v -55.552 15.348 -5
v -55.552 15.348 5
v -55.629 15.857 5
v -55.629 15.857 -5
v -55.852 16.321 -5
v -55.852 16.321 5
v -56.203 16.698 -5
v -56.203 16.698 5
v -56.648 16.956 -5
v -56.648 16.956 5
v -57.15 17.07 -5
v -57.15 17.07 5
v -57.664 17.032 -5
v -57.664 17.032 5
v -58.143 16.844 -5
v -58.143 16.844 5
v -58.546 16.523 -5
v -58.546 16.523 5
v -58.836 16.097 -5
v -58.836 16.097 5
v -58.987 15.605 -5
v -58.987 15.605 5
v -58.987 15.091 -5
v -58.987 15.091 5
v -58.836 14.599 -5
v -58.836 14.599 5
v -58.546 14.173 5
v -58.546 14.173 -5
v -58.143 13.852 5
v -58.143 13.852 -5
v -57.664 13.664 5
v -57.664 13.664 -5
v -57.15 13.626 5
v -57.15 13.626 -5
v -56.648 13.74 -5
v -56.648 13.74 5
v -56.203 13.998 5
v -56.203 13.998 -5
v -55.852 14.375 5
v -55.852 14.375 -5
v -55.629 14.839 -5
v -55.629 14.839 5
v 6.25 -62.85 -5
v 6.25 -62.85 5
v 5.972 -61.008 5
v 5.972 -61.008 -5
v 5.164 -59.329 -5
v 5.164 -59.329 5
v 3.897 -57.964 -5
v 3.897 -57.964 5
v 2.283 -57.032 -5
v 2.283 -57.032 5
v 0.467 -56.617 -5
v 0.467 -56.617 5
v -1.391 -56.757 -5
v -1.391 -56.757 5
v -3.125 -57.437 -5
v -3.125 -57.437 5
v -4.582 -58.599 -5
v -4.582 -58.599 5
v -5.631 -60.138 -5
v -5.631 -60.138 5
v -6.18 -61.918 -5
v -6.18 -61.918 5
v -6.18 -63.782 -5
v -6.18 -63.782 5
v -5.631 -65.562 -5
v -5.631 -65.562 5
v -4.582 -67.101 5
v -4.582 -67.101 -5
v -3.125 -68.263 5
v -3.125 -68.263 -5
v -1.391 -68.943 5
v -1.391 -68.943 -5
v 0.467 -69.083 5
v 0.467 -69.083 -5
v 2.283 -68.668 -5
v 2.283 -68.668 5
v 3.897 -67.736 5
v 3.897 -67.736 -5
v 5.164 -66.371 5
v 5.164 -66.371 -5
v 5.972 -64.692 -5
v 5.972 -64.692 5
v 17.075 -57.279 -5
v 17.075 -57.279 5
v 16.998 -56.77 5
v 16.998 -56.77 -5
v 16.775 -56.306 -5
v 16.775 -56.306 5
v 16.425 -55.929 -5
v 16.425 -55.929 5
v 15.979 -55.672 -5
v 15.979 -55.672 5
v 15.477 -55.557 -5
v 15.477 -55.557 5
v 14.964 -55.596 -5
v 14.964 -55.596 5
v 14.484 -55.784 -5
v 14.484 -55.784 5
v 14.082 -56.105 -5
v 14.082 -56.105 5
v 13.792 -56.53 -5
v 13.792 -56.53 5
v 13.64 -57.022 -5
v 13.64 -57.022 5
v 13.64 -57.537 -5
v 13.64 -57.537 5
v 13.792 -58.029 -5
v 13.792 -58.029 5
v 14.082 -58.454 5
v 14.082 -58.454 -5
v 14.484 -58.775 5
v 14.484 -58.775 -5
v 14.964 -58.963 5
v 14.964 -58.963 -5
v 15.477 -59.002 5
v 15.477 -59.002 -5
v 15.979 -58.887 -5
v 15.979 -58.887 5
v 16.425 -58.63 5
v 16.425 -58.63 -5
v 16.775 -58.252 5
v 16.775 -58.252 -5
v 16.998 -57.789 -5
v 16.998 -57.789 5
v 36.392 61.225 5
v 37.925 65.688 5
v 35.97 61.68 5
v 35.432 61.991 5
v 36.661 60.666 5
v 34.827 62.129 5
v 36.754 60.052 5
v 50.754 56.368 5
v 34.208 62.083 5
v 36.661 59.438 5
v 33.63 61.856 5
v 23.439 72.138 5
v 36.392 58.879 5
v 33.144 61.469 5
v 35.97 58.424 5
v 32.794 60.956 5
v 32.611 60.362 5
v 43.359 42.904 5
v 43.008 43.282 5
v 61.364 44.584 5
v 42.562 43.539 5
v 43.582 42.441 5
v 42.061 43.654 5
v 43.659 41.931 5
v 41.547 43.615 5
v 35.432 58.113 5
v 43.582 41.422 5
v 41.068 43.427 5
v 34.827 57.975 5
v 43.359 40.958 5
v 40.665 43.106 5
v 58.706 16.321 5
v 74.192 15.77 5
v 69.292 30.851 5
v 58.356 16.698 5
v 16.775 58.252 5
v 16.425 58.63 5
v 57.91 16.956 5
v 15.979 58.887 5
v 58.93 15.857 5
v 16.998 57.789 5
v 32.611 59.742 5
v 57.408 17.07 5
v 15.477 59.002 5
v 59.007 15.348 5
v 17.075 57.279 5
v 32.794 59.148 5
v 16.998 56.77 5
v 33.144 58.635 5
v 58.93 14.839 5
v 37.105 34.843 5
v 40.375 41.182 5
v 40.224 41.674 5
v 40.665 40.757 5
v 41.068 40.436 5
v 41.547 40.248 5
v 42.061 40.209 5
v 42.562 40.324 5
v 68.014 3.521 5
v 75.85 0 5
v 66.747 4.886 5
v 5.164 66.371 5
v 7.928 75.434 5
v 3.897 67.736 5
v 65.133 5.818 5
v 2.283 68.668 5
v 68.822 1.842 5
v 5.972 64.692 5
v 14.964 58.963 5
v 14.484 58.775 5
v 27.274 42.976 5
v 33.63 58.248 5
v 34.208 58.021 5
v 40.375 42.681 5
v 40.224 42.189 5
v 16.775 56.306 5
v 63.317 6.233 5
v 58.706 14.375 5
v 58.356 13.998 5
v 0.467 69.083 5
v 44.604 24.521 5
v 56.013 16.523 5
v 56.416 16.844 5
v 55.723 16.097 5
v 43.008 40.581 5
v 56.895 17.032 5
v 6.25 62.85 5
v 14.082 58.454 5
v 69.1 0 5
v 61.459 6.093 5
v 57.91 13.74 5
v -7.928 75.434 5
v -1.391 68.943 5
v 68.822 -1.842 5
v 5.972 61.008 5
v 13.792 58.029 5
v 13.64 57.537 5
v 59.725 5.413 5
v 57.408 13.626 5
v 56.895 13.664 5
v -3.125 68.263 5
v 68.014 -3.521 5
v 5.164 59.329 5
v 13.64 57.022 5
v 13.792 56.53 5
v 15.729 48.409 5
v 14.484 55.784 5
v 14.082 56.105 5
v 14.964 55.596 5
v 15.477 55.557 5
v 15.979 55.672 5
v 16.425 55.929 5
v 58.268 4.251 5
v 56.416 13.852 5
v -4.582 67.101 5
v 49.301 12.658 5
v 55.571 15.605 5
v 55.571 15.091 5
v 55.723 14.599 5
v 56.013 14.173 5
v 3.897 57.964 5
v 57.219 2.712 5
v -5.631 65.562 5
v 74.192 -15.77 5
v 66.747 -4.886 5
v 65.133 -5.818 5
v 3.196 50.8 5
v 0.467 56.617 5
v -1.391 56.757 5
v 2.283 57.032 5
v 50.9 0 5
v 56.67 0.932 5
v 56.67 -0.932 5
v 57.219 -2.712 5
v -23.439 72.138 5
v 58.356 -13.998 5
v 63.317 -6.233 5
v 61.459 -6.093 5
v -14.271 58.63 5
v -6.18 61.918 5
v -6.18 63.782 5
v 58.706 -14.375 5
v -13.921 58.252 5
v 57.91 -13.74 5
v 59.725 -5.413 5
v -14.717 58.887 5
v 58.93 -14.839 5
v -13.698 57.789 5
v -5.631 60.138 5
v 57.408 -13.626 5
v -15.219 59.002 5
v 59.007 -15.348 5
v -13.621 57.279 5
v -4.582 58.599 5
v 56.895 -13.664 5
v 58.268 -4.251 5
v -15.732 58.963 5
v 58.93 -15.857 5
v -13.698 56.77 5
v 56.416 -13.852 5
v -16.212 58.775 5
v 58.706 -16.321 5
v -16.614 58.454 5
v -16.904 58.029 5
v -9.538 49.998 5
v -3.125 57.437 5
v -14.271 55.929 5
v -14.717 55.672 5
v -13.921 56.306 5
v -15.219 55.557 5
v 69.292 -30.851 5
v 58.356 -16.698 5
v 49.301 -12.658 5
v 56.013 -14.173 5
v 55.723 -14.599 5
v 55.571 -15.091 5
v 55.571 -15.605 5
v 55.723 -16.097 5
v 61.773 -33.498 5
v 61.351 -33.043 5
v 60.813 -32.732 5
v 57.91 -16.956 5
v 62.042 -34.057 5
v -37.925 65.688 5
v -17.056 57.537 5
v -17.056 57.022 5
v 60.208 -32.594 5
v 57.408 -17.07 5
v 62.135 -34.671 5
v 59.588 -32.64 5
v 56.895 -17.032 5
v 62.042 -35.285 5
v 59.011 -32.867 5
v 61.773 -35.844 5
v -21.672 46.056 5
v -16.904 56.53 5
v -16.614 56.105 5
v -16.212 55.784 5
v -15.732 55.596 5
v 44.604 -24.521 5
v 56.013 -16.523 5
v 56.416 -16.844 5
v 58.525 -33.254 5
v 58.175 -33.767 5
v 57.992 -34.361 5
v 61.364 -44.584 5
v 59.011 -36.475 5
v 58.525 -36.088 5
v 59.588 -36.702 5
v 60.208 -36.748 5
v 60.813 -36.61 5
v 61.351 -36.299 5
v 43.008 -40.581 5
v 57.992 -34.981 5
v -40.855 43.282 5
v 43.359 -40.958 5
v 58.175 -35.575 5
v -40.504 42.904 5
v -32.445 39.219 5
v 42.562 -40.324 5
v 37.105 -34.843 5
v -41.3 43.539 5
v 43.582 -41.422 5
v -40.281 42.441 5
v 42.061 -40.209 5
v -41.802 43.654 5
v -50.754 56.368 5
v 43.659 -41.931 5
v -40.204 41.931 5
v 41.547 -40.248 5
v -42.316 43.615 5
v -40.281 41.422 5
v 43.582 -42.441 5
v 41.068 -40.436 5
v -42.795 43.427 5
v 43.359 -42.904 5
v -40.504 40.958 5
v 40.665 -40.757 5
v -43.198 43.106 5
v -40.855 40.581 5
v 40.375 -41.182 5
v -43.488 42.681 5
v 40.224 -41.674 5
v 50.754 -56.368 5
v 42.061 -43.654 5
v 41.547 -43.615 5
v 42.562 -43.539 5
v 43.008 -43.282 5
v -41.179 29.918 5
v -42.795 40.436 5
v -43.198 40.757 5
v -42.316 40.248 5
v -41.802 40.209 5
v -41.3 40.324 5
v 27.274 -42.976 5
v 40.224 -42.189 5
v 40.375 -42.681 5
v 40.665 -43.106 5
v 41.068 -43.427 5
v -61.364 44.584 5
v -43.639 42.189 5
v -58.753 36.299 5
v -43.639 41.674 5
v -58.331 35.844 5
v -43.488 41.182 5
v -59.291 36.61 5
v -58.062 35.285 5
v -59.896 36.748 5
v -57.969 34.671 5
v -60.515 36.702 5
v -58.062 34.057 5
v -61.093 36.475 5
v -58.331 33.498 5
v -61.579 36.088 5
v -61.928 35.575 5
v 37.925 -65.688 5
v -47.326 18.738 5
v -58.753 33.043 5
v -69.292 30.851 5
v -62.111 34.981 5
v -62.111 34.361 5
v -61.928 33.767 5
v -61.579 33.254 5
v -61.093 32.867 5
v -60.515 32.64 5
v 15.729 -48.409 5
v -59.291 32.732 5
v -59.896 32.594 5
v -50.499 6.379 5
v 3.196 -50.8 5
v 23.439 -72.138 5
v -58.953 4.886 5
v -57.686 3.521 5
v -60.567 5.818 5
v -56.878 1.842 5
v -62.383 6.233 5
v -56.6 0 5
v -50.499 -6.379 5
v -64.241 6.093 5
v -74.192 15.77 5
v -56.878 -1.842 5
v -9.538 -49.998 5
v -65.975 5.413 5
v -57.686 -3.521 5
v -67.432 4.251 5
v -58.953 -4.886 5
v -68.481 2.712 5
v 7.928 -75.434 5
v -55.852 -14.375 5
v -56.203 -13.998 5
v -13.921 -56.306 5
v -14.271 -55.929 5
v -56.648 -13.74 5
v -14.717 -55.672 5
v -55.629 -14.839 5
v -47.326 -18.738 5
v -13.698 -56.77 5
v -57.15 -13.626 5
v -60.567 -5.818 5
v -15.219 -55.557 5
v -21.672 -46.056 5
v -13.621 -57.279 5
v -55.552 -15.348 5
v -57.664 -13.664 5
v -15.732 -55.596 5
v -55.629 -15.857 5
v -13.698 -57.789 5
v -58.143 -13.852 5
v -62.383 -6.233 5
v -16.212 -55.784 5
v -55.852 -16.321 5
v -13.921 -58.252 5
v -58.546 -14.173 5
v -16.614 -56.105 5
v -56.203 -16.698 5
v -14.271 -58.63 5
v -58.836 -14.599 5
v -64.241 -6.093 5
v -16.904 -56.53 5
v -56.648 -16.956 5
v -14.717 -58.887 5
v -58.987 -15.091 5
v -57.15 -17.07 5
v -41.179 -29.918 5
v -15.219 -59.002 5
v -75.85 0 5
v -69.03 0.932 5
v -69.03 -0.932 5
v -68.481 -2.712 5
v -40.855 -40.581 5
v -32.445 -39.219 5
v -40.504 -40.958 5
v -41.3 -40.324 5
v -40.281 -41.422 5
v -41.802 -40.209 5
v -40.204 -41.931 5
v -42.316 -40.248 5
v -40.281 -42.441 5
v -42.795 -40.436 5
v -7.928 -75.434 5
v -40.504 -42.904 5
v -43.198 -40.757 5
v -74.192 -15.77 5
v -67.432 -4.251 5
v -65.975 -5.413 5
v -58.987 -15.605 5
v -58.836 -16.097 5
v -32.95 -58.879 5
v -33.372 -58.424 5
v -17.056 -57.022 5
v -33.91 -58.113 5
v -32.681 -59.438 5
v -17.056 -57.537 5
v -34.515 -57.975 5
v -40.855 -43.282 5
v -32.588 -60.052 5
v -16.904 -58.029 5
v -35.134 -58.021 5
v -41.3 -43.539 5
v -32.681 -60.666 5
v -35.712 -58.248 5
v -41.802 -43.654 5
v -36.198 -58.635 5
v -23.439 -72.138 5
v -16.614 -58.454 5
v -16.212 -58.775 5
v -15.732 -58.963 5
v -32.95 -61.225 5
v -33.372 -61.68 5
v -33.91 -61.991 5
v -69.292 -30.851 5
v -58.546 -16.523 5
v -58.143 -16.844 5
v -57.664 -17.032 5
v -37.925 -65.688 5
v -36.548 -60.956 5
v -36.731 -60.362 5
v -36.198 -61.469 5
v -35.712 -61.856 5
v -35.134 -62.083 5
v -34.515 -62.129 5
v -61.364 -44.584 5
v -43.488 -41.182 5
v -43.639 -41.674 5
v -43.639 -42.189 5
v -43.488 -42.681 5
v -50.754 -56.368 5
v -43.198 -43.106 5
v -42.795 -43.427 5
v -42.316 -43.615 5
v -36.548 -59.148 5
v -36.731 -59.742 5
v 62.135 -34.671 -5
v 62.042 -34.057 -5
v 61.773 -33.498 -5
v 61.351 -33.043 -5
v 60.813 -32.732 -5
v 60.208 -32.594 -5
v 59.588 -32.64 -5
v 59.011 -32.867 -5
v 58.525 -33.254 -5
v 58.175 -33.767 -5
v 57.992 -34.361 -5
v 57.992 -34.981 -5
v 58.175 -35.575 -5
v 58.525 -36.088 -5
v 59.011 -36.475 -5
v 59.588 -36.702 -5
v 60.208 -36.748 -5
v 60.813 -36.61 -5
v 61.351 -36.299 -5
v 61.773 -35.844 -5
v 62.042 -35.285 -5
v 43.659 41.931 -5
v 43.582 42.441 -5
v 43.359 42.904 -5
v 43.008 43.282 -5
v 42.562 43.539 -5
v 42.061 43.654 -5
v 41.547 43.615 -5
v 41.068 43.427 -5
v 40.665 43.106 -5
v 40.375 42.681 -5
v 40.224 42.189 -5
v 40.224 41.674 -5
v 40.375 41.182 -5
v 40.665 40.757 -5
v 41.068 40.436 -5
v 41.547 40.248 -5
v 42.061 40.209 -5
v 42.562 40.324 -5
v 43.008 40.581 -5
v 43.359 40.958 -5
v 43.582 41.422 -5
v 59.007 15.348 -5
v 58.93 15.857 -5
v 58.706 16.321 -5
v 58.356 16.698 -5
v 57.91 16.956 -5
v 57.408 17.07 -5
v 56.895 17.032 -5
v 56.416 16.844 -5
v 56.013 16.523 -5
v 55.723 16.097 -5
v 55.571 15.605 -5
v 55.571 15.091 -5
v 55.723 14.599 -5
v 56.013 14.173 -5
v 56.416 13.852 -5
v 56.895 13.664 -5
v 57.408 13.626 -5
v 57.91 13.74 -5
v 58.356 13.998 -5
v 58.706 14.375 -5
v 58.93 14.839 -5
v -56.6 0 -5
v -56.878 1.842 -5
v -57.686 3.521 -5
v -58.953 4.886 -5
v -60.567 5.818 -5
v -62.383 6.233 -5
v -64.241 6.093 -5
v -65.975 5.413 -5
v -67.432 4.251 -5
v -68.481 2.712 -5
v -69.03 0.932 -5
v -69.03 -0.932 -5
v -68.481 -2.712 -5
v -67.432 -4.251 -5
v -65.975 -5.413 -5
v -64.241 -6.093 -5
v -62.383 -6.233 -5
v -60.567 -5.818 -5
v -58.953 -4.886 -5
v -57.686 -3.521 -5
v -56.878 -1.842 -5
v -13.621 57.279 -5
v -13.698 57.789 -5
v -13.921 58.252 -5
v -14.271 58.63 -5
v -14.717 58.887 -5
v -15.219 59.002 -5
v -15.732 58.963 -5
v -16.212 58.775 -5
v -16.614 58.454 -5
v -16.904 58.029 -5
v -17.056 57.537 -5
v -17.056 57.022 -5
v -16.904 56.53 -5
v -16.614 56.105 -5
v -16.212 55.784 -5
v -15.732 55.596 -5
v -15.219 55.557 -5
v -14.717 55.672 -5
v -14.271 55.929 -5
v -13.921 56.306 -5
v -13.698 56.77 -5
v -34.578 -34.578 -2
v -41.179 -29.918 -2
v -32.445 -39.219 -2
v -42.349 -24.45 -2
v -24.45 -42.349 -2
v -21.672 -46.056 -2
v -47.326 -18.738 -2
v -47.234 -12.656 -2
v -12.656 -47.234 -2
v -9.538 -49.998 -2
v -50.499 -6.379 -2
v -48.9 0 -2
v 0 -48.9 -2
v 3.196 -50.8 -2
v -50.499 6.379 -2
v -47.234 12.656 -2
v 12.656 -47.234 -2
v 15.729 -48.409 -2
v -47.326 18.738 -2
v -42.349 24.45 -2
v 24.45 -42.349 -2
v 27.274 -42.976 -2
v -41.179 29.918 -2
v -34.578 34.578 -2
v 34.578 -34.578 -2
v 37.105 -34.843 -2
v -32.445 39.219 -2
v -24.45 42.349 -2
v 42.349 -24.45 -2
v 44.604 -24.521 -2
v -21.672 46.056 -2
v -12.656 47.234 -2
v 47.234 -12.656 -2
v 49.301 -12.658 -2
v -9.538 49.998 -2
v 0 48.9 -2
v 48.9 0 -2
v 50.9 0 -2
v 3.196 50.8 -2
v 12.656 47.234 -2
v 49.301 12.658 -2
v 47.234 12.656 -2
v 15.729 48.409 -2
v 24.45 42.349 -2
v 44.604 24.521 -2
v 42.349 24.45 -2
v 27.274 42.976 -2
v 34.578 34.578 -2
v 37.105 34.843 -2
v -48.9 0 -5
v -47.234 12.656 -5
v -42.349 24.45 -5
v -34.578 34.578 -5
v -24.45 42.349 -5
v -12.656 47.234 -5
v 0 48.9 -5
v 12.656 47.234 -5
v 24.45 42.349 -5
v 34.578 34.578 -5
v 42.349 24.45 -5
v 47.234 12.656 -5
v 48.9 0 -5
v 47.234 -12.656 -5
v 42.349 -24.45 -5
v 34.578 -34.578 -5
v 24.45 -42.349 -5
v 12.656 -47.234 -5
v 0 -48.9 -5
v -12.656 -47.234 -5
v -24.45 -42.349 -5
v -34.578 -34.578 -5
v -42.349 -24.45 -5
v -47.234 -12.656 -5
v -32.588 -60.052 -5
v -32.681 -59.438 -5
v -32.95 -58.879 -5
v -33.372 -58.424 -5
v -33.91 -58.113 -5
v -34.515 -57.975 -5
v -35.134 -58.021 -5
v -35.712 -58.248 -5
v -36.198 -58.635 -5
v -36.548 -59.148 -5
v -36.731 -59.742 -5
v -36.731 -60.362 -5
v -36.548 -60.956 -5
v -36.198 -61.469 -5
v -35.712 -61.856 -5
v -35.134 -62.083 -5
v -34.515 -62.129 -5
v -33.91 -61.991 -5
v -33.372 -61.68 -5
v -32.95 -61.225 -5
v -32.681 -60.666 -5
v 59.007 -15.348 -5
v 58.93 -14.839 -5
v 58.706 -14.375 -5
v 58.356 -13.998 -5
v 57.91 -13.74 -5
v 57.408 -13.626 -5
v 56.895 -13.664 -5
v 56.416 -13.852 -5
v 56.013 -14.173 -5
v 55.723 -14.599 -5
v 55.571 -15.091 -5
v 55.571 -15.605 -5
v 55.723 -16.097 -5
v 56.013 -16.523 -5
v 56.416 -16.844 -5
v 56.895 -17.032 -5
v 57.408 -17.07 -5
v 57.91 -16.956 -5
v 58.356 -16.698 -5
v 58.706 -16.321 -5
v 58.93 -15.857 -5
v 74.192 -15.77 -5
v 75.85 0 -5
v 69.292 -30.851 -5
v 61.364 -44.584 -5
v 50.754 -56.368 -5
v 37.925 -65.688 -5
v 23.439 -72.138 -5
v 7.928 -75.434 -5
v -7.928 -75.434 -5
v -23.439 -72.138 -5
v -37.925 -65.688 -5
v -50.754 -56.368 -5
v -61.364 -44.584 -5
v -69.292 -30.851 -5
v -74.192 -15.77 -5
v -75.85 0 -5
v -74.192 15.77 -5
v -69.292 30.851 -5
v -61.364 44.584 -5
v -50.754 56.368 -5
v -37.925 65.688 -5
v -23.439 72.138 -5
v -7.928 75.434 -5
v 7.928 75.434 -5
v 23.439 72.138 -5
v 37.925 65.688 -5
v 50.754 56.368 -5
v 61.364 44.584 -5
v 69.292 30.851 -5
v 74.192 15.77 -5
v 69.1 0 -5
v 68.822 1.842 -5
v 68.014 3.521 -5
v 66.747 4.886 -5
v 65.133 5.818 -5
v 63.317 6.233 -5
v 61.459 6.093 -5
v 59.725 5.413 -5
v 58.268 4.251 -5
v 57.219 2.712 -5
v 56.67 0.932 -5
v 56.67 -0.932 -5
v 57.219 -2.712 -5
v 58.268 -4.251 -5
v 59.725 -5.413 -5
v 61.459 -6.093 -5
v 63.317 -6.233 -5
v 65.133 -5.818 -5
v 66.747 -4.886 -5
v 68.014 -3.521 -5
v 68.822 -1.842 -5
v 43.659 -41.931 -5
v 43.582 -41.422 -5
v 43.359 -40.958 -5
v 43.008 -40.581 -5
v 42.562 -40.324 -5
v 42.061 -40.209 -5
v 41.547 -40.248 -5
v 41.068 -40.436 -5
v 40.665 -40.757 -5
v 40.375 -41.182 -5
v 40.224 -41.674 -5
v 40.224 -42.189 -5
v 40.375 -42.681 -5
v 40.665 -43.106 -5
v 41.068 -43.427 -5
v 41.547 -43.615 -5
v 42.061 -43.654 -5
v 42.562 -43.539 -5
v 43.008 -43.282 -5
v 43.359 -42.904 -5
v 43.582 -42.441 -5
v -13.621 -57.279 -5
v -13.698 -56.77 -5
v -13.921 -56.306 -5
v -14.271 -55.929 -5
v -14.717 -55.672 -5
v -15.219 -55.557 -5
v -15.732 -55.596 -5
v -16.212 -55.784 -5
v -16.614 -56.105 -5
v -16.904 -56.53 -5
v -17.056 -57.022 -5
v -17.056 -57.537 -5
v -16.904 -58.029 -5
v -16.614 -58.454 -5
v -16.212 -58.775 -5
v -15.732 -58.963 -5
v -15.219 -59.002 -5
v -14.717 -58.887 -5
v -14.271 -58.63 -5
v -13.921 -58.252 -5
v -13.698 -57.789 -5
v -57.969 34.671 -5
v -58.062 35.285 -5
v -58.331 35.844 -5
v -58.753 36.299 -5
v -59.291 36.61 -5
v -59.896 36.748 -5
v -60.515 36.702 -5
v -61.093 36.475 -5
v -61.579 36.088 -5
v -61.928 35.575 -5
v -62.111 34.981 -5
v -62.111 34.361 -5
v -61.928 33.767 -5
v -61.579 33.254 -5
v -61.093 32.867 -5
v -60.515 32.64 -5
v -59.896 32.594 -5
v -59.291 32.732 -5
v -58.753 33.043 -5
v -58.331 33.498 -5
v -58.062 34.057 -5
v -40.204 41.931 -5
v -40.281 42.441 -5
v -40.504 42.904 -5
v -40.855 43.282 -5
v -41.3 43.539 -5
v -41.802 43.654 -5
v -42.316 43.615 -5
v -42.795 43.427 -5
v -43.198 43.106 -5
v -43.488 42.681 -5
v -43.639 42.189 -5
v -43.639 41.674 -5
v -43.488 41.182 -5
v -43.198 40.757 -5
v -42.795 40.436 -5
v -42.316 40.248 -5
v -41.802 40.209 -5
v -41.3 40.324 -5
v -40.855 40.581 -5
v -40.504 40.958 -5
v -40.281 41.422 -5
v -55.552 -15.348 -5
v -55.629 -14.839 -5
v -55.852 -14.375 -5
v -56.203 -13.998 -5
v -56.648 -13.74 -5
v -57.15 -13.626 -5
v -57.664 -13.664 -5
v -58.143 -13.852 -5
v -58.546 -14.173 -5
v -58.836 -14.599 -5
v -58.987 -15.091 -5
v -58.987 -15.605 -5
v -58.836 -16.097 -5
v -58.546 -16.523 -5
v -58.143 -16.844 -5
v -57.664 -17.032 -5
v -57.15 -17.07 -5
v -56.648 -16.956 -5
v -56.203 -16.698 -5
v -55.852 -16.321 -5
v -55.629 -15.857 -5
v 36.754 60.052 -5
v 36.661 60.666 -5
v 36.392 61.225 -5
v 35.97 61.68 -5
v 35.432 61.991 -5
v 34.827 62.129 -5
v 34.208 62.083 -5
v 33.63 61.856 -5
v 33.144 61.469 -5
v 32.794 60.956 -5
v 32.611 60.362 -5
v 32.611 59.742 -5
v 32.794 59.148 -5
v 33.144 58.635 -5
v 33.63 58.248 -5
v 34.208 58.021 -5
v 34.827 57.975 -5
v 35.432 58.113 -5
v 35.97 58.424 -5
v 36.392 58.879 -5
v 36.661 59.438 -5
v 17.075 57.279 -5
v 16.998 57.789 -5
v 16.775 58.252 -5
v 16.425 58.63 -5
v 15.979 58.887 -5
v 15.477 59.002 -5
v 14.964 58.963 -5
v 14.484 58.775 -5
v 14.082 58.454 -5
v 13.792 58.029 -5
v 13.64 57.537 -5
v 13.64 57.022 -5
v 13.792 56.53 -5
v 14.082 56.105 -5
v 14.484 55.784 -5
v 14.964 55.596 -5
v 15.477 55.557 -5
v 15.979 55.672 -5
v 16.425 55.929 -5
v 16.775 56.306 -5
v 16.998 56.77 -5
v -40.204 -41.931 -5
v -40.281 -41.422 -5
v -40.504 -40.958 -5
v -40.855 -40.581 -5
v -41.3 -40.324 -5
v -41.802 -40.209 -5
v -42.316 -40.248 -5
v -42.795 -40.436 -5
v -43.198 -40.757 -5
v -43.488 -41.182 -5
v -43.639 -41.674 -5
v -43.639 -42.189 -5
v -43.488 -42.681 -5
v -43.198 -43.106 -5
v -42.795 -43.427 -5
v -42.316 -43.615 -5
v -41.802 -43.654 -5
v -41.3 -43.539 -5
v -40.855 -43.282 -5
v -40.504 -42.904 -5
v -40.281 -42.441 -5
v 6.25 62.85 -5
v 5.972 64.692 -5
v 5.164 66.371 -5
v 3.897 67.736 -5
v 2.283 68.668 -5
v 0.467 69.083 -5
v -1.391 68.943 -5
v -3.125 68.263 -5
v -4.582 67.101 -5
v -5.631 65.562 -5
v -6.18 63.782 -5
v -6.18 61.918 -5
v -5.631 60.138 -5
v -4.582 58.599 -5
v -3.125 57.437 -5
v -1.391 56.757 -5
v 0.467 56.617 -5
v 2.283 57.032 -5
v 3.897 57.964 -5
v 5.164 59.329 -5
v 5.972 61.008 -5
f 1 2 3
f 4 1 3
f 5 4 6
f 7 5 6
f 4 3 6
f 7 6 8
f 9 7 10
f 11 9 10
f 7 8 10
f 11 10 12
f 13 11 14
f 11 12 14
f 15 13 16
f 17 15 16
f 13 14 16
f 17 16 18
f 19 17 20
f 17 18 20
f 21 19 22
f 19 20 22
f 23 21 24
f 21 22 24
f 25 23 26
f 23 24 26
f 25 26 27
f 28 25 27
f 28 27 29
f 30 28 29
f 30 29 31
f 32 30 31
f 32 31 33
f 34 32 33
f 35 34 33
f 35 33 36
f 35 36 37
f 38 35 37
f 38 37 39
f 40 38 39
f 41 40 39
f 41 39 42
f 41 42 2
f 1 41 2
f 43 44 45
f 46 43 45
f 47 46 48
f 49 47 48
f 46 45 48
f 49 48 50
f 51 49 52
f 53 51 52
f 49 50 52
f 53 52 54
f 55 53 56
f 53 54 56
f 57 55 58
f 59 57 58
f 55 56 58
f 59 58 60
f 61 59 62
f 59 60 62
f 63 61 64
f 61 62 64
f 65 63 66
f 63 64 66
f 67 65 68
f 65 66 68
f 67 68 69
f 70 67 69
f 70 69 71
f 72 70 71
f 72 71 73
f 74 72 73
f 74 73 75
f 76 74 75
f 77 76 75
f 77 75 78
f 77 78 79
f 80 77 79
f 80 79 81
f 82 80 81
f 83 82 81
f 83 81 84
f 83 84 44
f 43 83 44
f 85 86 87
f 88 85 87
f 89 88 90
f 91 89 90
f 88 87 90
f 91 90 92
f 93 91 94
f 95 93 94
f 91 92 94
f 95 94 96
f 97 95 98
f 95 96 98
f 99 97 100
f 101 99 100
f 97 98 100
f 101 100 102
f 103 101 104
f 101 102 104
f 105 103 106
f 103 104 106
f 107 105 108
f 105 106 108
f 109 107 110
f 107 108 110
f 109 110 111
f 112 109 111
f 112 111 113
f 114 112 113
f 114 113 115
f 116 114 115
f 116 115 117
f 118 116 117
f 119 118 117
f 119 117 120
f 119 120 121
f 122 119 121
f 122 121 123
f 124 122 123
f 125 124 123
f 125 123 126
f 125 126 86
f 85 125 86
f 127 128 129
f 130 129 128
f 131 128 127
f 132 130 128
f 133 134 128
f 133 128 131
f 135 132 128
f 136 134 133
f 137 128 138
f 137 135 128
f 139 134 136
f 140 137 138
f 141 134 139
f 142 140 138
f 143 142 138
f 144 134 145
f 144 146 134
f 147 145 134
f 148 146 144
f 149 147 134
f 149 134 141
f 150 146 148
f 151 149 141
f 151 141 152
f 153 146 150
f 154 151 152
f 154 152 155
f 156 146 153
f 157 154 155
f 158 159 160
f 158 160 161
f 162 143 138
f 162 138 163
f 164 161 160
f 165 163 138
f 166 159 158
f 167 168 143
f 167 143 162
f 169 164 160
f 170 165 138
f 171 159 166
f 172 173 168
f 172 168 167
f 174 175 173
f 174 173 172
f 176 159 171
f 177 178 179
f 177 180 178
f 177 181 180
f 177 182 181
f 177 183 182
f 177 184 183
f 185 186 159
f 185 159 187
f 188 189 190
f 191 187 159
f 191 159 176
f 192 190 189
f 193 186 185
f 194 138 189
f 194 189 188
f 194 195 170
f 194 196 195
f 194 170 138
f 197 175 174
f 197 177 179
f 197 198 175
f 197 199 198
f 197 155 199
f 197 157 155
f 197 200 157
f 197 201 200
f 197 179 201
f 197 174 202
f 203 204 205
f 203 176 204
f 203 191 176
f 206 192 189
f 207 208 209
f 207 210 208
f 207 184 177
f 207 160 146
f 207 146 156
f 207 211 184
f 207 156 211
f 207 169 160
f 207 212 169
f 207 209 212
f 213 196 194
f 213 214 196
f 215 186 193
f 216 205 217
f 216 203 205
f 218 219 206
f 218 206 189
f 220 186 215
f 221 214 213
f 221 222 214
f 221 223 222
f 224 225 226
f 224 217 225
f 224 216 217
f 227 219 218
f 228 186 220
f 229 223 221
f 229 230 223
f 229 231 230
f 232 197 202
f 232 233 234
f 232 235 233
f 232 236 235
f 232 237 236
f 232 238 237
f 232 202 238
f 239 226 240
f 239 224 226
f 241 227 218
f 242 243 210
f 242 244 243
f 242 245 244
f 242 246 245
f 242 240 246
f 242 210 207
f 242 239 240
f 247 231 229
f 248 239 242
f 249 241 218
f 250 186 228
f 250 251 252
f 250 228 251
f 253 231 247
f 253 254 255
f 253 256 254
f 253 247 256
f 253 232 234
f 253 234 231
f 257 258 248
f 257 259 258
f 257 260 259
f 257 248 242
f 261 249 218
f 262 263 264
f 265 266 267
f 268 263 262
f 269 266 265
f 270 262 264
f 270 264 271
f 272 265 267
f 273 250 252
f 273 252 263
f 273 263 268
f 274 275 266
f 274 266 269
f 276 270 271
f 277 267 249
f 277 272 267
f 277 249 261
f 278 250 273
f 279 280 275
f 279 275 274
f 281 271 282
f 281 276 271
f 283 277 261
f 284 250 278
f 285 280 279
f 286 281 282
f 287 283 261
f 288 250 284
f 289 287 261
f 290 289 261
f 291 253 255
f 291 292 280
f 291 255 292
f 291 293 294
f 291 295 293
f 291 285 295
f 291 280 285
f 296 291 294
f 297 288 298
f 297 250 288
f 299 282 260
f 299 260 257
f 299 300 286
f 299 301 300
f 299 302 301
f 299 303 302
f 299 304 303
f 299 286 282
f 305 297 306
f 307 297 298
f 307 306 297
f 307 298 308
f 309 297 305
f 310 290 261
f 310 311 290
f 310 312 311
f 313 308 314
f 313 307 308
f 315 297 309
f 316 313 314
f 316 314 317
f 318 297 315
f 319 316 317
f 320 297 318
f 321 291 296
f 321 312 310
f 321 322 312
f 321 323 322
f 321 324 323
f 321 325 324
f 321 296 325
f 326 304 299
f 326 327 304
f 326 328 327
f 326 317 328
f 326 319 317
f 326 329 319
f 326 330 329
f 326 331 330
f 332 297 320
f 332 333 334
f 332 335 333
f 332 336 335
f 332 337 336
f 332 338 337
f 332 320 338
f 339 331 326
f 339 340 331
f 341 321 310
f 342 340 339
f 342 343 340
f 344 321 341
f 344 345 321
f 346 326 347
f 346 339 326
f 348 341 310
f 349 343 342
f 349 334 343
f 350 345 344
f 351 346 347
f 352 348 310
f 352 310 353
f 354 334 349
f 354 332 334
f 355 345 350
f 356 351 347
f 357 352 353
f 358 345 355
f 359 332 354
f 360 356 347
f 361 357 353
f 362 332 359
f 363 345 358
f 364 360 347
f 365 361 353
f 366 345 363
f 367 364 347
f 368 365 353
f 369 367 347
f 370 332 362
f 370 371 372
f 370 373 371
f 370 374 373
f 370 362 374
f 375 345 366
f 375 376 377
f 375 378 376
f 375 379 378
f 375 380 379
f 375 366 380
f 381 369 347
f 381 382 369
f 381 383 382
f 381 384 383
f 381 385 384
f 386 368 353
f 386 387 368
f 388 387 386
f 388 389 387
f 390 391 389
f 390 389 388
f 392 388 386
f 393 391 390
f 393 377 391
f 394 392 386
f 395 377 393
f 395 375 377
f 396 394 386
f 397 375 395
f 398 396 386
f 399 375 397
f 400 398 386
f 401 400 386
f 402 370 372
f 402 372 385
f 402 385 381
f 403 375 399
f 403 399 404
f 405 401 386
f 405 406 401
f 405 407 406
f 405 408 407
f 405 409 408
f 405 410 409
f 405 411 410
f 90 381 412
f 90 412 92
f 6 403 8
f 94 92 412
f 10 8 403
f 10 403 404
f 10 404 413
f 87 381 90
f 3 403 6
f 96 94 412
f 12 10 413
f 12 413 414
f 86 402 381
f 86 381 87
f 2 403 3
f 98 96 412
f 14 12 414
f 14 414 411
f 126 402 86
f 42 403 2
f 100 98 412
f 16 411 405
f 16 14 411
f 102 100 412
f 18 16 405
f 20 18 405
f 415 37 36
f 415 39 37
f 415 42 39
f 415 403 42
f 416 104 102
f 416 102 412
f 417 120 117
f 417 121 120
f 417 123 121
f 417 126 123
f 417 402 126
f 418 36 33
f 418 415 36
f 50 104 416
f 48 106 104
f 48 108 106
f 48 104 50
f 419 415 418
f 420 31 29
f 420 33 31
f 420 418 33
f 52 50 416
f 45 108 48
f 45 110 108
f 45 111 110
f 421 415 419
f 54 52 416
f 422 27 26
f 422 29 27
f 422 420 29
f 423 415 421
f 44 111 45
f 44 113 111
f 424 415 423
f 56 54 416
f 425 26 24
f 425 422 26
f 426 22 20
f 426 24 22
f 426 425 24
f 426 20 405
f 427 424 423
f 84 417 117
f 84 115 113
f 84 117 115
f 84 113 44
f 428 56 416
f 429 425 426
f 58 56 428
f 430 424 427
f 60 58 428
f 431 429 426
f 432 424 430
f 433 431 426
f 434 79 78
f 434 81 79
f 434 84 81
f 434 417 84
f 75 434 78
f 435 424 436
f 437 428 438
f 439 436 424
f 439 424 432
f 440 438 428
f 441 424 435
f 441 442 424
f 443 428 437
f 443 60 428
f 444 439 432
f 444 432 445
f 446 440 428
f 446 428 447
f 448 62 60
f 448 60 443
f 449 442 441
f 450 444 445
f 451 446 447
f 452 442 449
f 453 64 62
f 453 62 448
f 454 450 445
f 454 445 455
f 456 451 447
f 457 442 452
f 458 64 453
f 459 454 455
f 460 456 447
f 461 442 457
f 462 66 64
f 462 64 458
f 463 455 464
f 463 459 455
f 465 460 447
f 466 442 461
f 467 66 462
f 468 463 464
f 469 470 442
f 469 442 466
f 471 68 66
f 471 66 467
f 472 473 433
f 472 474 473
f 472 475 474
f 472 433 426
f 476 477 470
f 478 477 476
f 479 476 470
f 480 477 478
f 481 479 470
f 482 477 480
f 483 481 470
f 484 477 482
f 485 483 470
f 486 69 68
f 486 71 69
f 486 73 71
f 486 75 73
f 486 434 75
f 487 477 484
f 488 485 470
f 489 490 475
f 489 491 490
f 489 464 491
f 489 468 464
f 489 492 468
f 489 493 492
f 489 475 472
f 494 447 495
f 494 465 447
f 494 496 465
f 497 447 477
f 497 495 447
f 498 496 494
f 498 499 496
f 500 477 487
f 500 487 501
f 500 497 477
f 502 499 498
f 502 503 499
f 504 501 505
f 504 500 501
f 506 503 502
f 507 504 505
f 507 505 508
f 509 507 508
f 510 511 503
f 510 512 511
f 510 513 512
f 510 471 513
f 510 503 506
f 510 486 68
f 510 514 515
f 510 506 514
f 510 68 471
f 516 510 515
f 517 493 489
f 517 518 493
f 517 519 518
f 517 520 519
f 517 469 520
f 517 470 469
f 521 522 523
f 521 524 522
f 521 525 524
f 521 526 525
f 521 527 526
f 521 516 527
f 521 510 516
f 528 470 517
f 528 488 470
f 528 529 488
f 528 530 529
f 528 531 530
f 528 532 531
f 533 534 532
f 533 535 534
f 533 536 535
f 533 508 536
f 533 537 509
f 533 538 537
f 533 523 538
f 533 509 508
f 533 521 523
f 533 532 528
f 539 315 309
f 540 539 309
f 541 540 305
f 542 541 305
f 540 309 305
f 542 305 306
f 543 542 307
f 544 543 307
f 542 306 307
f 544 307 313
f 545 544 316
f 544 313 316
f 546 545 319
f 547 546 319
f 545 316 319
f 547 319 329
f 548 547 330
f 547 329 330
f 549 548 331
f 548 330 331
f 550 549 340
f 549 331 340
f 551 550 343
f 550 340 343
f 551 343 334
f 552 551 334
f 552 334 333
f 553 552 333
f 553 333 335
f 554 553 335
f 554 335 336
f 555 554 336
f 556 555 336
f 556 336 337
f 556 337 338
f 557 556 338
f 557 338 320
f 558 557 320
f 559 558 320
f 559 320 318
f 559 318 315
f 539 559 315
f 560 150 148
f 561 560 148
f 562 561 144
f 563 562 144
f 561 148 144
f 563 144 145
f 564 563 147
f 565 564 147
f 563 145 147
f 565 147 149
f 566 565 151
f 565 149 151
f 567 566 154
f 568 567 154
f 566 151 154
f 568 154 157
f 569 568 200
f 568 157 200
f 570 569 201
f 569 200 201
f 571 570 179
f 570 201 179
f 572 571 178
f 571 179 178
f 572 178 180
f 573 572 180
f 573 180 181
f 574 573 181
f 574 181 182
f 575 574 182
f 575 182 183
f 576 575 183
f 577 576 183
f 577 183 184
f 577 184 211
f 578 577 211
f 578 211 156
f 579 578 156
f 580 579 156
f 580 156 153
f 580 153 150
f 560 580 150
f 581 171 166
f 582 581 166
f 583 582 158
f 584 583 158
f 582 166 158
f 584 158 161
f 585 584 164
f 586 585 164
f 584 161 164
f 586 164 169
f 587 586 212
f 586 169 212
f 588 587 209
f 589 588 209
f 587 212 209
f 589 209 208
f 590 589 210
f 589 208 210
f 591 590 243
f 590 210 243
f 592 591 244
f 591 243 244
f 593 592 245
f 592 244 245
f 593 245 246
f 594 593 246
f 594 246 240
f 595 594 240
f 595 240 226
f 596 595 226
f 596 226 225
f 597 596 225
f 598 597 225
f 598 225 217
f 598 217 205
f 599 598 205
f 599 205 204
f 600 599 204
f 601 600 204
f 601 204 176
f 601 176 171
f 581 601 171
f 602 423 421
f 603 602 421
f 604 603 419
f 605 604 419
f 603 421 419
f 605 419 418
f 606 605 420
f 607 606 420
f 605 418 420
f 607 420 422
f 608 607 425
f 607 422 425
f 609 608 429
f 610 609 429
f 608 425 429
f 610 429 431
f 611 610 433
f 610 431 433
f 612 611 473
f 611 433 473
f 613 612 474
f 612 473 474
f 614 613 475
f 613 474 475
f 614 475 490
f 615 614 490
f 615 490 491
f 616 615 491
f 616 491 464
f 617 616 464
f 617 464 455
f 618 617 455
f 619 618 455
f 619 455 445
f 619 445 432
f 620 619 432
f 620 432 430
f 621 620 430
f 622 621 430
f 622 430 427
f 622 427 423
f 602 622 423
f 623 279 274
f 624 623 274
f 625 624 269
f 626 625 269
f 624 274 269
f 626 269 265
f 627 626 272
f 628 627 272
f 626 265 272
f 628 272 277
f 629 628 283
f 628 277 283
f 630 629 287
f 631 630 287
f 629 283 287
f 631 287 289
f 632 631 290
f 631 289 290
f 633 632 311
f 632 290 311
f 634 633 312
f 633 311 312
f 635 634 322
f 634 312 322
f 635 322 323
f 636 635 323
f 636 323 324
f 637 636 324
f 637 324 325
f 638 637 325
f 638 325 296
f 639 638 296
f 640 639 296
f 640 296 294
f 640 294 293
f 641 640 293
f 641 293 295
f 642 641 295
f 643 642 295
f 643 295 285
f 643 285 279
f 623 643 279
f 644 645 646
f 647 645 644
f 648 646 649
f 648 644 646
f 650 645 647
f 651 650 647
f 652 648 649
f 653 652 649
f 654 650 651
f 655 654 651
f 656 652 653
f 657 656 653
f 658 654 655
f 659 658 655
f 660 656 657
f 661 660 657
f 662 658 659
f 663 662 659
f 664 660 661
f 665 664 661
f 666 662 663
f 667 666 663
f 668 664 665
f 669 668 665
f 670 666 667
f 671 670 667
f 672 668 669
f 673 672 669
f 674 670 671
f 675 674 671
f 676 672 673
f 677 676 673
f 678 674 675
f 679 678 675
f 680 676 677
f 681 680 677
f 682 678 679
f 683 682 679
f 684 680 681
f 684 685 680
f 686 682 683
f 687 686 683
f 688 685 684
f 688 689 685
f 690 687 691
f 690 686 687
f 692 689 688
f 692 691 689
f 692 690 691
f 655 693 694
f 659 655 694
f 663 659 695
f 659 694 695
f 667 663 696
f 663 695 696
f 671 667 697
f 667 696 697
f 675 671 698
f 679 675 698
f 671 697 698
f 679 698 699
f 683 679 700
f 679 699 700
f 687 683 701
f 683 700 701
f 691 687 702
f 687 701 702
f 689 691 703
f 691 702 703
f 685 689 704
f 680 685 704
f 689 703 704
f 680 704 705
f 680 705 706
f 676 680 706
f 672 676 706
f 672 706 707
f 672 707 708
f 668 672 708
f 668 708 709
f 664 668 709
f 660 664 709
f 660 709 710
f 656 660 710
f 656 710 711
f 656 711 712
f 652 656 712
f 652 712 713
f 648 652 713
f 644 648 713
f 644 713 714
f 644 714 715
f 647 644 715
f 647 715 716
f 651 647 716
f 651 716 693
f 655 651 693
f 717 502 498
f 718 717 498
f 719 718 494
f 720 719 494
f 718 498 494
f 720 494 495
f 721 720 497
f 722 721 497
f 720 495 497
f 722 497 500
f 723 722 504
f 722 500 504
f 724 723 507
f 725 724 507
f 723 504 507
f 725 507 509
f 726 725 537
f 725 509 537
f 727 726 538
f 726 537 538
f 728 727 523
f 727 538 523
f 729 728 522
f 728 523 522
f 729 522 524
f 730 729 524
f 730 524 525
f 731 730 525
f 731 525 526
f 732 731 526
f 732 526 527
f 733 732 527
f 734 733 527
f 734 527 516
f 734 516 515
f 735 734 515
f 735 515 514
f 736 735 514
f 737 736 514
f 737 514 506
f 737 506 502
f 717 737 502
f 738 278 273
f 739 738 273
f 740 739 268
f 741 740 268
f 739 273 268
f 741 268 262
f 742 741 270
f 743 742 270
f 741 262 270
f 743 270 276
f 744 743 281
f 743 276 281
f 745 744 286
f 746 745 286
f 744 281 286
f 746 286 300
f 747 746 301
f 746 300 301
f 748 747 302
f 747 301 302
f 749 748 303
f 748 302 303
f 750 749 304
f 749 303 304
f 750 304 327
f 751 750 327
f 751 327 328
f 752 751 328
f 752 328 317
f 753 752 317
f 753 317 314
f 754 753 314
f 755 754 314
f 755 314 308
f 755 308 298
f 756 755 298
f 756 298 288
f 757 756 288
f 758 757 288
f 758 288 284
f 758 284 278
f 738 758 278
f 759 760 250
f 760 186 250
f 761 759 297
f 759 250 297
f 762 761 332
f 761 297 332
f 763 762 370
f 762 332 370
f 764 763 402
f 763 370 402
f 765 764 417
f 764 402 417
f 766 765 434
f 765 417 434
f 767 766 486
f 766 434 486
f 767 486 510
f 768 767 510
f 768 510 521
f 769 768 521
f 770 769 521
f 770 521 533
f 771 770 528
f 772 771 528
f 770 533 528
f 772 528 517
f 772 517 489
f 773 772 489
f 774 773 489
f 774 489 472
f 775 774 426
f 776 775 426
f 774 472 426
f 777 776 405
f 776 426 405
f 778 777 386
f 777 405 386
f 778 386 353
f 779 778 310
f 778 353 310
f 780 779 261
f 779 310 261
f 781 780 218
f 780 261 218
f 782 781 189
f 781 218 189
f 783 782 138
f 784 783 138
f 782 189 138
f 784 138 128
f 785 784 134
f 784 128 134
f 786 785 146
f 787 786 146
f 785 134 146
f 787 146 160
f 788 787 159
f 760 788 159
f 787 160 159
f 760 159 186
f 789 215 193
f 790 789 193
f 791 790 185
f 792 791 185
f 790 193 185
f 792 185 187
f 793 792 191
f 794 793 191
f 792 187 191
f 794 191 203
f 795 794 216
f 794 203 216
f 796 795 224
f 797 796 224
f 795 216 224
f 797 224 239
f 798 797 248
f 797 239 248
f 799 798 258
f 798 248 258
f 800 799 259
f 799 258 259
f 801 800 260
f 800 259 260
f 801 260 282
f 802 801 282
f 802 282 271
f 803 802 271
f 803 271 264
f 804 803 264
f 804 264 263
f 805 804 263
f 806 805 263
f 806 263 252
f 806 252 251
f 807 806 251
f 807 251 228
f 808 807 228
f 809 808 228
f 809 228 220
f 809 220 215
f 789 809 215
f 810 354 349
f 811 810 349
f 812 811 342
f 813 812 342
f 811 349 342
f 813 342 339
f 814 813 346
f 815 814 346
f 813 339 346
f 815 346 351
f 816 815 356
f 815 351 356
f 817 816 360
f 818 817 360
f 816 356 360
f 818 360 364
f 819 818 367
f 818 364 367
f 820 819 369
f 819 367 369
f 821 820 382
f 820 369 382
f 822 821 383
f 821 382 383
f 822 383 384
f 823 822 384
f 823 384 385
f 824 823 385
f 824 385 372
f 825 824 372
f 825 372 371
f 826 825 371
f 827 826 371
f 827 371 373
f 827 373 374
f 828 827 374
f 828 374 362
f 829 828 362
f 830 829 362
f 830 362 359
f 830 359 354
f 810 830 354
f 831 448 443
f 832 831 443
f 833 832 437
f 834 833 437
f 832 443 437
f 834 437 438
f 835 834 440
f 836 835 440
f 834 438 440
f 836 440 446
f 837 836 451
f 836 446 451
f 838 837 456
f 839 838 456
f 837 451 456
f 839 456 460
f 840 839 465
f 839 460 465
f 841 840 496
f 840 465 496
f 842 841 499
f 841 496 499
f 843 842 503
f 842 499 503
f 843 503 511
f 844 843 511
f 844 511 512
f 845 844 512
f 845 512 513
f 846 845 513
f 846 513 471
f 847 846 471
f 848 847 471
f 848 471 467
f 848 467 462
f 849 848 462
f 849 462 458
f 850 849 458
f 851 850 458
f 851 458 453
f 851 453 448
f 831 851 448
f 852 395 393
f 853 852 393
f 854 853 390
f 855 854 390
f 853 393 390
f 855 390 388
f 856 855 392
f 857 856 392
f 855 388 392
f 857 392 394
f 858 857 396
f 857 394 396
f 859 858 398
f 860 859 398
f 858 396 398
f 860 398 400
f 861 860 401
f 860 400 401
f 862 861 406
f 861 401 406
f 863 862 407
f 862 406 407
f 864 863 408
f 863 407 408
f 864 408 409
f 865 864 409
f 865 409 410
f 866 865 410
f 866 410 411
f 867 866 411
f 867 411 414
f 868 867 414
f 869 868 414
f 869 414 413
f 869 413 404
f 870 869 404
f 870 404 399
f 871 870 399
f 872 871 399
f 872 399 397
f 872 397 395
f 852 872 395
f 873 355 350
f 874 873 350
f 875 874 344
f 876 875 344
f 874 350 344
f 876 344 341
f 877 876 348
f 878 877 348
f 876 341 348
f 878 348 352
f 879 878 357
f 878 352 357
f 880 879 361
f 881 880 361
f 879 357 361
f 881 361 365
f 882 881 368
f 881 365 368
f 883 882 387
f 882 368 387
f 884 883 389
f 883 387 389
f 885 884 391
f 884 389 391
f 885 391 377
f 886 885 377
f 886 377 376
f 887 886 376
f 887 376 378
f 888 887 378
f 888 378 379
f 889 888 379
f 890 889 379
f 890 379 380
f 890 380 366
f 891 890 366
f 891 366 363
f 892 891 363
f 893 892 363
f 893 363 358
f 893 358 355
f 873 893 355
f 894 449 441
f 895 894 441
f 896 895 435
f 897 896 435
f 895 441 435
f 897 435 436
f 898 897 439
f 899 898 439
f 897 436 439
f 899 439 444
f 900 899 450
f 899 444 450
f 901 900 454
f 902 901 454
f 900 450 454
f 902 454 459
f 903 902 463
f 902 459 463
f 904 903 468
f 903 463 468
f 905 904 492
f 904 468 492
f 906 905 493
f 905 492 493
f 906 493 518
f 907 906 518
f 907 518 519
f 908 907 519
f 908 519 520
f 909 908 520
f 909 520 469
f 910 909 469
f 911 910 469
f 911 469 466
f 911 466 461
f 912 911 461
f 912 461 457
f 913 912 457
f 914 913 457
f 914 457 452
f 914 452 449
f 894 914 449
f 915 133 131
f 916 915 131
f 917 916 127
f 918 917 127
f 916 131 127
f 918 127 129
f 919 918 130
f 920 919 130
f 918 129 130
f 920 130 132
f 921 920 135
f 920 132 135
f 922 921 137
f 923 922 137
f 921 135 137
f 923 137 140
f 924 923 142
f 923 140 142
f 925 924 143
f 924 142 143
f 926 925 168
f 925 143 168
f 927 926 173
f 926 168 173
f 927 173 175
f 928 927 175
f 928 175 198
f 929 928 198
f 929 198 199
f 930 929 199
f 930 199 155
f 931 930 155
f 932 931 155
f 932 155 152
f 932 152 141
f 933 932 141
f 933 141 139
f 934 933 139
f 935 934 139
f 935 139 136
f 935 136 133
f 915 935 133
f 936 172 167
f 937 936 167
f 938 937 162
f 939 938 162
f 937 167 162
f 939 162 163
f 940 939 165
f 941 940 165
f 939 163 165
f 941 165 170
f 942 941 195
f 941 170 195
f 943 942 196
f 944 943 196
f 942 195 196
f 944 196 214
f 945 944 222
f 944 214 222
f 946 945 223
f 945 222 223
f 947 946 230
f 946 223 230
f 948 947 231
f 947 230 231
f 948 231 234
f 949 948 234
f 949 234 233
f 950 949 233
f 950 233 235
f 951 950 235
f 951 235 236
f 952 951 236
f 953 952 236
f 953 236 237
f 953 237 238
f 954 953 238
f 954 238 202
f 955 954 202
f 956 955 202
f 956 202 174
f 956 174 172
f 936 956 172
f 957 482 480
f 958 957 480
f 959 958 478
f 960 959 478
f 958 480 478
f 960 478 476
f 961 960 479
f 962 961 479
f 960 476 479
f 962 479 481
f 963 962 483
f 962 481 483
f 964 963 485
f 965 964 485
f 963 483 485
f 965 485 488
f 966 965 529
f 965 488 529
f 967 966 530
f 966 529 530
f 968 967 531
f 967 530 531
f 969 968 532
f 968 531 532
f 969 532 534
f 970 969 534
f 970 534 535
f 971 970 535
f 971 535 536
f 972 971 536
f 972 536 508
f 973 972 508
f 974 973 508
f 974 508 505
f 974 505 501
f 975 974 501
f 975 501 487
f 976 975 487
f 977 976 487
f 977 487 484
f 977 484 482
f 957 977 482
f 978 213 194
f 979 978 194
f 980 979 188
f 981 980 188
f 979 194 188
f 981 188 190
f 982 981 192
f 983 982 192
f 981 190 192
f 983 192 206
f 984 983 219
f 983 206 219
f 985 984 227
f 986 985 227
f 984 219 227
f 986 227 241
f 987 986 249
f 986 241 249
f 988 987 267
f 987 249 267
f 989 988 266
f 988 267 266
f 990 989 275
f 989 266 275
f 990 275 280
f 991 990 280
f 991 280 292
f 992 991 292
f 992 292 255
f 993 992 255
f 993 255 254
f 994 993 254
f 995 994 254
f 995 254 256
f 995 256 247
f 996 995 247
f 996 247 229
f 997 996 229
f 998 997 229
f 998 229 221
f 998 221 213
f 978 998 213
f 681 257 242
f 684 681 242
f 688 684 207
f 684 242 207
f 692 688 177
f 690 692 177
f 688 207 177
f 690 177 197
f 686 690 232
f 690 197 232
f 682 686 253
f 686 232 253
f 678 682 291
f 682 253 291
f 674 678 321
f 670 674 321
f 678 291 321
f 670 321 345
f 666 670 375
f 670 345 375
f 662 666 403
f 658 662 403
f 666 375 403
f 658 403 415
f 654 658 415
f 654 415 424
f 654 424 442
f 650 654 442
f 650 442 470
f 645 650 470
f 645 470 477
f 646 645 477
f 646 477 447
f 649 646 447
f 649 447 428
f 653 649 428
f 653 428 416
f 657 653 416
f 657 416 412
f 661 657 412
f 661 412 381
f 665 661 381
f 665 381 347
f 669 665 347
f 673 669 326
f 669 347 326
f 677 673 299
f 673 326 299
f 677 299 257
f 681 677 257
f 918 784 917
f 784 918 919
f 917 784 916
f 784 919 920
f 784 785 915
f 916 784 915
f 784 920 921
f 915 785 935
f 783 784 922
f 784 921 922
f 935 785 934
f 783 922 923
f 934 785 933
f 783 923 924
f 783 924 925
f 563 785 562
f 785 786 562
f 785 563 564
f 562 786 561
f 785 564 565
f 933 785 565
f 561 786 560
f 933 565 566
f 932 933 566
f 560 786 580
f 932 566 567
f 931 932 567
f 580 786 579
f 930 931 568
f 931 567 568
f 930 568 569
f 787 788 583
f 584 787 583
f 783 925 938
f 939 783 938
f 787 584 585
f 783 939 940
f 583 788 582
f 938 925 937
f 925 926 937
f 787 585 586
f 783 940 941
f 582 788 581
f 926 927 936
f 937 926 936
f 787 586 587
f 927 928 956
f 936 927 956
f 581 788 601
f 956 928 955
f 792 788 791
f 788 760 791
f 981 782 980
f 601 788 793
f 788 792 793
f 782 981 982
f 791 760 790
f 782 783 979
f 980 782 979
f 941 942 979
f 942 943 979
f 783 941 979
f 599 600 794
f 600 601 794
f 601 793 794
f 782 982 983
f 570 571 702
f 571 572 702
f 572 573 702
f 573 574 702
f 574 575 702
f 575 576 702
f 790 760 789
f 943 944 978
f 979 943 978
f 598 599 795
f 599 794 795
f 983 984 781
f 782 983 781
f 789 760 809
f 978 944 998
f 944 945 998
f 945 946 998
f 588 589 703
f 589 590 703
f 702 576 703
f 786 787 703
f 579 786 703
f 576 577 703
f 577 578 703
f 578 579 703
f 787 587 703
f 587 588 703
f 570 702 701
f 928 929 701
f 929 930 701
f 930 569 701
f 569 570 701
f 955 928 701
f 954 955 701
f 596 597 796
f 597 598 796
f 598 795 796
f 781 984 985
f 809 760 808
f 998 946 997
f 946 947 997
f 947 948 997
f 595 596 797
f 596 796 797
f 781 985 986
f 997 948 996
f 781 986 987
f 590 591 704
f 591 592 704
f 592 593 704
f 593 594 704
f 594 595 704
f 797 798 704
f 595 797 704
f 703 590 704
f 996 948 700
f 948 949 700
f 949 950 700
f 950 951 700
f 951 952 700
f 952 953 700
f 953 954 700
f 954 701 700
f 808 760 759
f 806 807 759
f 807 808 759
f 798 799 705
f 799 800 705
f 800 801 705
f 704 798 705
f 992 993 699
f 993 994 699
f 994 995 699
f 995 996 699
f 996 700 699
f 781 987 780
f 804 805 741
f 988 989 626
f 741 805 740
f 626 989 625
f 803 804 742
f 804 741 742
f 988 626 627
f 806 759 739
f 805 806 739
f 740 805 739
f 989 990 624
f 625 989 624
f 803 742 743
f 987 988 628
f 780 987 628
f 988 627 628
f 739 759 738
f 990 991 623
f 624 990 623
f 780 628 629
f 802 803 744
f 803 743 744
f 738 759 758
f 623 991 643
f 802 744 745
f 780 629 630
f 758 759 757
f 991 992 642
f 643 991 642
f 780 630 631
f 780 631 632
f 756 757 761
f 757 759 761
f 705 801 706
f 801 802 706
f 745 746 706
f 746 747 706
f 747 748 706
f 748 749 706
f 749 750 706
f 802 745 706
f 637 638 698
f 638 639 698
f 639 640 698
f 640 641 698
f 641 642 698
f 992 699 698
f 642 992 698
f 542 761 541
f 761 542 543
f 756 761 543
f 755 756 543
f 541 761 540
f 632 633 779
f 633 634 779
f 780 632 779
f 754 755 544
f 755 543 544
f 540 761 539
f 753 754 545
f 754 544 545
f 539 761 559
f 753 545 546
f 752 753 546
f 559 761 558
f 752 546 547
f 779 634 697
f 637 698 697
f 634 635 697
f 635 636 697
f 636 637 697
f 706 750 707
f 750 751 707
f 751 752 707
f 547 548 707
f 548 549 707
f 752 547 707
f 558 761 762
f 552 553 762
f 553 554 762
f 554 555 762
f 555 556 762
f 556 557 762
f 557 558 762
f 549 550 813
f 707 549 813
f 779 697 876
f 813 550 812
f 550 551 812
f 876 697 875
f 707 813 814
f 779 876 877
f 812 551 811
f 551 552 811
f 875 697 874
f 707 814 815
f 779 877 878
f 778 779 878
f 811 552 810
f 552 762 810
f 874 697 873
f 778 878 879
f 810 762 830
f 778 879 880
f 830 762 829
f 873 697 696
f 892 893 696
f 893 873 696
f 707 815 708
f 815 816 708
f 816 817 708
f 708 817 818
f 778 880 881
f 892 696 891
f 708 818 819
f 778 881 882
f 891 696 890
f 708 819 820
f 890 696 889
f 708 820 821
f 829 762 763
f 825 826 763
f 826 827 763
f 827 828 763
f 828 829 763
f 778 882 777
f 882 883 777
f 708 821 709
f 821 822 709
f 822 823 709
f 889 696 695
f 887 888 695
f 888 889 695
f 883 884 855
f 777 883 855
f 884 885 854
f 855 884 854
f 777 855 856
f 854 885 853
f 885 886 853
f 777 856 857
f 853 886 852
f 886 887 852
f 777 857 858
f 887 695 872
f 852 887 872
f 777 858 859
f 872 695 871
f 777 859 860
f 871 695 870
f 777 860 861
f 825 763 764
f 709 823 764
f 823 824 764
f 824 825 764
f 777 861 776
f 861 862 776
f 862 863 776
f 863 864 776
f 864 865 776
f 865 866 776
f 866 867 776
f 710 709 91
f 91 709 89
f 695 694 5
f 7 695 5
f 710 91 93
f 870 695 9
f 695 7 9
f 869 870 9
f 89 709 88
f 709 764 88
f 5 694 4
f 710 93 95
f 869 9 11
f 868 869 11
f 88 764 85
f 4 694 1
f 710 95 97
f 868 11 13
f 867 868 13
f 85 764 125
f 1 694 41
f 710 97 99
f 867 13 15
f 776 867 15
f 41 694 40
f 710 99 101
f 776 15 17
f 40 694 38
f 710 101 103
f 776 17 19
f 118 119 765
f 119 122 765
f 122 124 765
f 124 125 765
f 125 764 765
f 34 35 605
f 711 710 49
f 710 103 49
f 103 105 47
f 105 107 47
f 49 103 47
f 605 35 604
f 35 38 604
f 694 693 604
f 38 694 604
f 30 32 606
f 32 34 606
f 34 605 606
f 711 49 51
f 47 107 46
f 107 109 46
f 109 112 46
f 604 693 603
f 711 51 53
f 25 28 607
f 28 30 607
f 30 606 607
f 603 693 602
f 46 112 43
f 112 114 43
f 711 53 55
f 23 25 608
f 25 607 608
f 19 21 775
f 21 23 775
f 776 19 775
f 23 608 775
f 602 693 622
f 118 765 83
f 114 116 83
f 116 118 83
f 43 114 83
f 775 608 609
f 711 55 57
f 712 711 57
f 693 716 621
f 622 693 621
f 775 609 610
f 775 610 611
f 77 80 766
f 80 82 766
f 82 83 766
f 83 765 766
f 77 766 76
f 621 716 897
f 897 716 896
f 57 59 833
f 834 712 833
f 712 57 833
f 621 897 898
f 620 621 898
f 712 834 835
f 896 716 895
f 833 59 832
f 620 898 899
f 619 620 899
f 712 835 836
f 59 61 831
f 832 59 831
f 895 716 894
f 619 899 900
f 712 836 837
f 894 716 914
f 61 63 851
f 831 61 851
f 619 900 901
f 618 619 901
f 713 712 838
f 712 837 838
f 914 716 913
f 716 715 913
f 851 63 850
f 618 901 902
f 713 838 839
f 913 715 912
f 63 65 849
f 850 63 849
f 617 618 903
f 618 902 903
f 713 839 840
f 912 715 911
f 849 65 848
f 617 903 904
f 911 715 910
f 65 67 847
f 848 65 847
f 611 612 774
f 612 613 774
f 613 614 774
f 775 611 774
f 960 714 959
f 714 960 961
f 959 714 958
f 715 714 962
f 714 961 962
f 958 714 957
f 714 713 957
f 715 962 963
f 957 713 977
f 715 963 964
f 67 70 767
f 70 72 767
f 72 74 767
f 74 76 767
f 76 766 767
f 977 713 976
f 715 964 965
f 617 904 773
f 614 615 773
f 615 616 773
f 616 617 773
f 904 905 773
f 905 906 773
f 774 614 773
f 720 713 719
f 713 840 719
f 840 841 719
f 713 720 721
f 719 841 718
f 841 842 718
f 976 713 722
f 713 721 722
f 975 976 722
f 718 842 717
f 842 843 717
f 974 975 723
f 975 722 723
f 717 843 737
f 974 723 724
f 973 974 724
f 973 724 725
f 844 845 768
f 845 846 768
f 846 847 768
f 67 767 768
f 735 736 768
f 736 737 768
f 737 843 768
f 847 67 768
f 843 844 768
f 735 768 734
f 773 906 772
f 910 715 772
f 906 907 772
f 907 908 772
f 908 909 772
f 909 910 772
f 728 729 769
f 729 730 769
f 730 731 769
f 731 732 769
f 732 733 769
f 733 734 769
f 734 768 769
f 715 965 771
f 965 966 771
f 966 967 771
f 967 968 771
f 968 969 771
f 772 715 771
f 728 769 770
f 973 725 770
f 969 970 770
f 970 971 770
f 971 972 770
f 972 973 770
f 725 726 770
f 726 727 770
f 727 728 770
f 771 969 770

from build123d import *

# Parameters (mm, degrees)
SKETCH1_W                                = 75.85
SKETCH1_H                                = 10
M3_5_CLEARANCE_HOLE1_D                   = 4.1656
M3_5_CLEARANCE_HOLE1_DEPTH               = 10
M3_CLEARANCE_HOLE1_D                     = 3.4544
M3_CLEARANCE_HOLE1_DEPTH                 = 10
F_12_5_12_5_DIAMETER_HOLE1_D             = 12.5
F_12_5_12_5_DIAMETER_HOLE1_DEPTH         = 10
CBORE_FOR_M90_HEX_HEAD_BOLT1_D           = 97.8
CBORE_FOR_M90_HEX_HEAD_BOLT1_DEPTH       = 10
CBORE_FOR_M90_HEX_HEAD_BOLT1_CBORE_D     = 101.8
CBORE_FOR_M90_HEX_HEAD_BOLT1_CBORE_DEPTH = 7


with BuildPart() as part:
    # Sketch1 → Revolve1 (revolve)
    with BuildSketch(Plane.XZ):
        with Locations((37.925, 0)):
            Rectangle(SKETCH1_W, SKETCH1_H)
    revolve(axis=Axis((0, 0, 5), (0, 0, -1)))

    # M3.5 Clearance Hole1
    with Locations(Plane(origin=(0, 0, -5), x_dir=(-1, 0, 0), z_dir=(0, 0, -1))):
        with Locations((60.051933549, 34.671), (-34.671, 60.051933549), (-60.051933549, -34.671), (34.671, -60.051933549)):
            Hole(M3_5_CLEARANCE_HOLE1_D / 2, depth=M3_5_CLEARANCE_HOLE1_DEPTH)

    # M3 Clearance Hole1
    with Locations(Plane(origin=(0, 0, -5), x_dir=(-1, 0, 0), z_dir=(0, 0, -1))):
        with Locations((41.931432124, 41.931432124), (57.279401499, 15.347969375), (57.279401499, -15.347969375), (41.931432124, -41.931432124), (15.347969375, -57.279401499), (-15.347969375, -57.279401499), (-41.931432124, -41.931432124), (-57.279401499, -15.347969375), (-57.279401499, 15.347969375), (-41.931432124, 41.931432124), (-15.347969375, 57.279401499), (15.347969375, 57.279401499)):
            Hole(M3_CLEARANCE_HOLE1_D / 2, depth=M3_CLEARANCE_HOLE1_DEPTH)

    # Ø12.5 (12.5) Diameter Hole1
    with Locations(Plane(origin=(0, 0, -5), x_dir=(-1, 0, 0), z_dir=(0, 0, -1))):
        with Locations((62.85, 0), (0, -62.85), (-62.85, 0), (0, 62.85)):
            Hole(F_12_5_12_5_DIAMETER_HOLE1_D / 2, depth=F_12_5_12_5_DIAMETER_HOLE1_DEPTH)

    # CBORE for M90 Hex Head Bolt1
    with Locations(Plane.XY.offset(5)):
        with Locations((0, 0)):
            CounterBoreHole(CBORE_FOR_M90_HEX_HEAD_BOLT1_D / 2, CBORE_FOR_M90_HEX_HEAD_BOLT1_CBORE_D / 2, CBORE_FOR_M90_HEX_HEAD_BOLT1_CBORE_DEPTH, depth=CBORE_FOR_M90_HEX_HEAD_BOLT1_DEPTH)


solid = part.part
